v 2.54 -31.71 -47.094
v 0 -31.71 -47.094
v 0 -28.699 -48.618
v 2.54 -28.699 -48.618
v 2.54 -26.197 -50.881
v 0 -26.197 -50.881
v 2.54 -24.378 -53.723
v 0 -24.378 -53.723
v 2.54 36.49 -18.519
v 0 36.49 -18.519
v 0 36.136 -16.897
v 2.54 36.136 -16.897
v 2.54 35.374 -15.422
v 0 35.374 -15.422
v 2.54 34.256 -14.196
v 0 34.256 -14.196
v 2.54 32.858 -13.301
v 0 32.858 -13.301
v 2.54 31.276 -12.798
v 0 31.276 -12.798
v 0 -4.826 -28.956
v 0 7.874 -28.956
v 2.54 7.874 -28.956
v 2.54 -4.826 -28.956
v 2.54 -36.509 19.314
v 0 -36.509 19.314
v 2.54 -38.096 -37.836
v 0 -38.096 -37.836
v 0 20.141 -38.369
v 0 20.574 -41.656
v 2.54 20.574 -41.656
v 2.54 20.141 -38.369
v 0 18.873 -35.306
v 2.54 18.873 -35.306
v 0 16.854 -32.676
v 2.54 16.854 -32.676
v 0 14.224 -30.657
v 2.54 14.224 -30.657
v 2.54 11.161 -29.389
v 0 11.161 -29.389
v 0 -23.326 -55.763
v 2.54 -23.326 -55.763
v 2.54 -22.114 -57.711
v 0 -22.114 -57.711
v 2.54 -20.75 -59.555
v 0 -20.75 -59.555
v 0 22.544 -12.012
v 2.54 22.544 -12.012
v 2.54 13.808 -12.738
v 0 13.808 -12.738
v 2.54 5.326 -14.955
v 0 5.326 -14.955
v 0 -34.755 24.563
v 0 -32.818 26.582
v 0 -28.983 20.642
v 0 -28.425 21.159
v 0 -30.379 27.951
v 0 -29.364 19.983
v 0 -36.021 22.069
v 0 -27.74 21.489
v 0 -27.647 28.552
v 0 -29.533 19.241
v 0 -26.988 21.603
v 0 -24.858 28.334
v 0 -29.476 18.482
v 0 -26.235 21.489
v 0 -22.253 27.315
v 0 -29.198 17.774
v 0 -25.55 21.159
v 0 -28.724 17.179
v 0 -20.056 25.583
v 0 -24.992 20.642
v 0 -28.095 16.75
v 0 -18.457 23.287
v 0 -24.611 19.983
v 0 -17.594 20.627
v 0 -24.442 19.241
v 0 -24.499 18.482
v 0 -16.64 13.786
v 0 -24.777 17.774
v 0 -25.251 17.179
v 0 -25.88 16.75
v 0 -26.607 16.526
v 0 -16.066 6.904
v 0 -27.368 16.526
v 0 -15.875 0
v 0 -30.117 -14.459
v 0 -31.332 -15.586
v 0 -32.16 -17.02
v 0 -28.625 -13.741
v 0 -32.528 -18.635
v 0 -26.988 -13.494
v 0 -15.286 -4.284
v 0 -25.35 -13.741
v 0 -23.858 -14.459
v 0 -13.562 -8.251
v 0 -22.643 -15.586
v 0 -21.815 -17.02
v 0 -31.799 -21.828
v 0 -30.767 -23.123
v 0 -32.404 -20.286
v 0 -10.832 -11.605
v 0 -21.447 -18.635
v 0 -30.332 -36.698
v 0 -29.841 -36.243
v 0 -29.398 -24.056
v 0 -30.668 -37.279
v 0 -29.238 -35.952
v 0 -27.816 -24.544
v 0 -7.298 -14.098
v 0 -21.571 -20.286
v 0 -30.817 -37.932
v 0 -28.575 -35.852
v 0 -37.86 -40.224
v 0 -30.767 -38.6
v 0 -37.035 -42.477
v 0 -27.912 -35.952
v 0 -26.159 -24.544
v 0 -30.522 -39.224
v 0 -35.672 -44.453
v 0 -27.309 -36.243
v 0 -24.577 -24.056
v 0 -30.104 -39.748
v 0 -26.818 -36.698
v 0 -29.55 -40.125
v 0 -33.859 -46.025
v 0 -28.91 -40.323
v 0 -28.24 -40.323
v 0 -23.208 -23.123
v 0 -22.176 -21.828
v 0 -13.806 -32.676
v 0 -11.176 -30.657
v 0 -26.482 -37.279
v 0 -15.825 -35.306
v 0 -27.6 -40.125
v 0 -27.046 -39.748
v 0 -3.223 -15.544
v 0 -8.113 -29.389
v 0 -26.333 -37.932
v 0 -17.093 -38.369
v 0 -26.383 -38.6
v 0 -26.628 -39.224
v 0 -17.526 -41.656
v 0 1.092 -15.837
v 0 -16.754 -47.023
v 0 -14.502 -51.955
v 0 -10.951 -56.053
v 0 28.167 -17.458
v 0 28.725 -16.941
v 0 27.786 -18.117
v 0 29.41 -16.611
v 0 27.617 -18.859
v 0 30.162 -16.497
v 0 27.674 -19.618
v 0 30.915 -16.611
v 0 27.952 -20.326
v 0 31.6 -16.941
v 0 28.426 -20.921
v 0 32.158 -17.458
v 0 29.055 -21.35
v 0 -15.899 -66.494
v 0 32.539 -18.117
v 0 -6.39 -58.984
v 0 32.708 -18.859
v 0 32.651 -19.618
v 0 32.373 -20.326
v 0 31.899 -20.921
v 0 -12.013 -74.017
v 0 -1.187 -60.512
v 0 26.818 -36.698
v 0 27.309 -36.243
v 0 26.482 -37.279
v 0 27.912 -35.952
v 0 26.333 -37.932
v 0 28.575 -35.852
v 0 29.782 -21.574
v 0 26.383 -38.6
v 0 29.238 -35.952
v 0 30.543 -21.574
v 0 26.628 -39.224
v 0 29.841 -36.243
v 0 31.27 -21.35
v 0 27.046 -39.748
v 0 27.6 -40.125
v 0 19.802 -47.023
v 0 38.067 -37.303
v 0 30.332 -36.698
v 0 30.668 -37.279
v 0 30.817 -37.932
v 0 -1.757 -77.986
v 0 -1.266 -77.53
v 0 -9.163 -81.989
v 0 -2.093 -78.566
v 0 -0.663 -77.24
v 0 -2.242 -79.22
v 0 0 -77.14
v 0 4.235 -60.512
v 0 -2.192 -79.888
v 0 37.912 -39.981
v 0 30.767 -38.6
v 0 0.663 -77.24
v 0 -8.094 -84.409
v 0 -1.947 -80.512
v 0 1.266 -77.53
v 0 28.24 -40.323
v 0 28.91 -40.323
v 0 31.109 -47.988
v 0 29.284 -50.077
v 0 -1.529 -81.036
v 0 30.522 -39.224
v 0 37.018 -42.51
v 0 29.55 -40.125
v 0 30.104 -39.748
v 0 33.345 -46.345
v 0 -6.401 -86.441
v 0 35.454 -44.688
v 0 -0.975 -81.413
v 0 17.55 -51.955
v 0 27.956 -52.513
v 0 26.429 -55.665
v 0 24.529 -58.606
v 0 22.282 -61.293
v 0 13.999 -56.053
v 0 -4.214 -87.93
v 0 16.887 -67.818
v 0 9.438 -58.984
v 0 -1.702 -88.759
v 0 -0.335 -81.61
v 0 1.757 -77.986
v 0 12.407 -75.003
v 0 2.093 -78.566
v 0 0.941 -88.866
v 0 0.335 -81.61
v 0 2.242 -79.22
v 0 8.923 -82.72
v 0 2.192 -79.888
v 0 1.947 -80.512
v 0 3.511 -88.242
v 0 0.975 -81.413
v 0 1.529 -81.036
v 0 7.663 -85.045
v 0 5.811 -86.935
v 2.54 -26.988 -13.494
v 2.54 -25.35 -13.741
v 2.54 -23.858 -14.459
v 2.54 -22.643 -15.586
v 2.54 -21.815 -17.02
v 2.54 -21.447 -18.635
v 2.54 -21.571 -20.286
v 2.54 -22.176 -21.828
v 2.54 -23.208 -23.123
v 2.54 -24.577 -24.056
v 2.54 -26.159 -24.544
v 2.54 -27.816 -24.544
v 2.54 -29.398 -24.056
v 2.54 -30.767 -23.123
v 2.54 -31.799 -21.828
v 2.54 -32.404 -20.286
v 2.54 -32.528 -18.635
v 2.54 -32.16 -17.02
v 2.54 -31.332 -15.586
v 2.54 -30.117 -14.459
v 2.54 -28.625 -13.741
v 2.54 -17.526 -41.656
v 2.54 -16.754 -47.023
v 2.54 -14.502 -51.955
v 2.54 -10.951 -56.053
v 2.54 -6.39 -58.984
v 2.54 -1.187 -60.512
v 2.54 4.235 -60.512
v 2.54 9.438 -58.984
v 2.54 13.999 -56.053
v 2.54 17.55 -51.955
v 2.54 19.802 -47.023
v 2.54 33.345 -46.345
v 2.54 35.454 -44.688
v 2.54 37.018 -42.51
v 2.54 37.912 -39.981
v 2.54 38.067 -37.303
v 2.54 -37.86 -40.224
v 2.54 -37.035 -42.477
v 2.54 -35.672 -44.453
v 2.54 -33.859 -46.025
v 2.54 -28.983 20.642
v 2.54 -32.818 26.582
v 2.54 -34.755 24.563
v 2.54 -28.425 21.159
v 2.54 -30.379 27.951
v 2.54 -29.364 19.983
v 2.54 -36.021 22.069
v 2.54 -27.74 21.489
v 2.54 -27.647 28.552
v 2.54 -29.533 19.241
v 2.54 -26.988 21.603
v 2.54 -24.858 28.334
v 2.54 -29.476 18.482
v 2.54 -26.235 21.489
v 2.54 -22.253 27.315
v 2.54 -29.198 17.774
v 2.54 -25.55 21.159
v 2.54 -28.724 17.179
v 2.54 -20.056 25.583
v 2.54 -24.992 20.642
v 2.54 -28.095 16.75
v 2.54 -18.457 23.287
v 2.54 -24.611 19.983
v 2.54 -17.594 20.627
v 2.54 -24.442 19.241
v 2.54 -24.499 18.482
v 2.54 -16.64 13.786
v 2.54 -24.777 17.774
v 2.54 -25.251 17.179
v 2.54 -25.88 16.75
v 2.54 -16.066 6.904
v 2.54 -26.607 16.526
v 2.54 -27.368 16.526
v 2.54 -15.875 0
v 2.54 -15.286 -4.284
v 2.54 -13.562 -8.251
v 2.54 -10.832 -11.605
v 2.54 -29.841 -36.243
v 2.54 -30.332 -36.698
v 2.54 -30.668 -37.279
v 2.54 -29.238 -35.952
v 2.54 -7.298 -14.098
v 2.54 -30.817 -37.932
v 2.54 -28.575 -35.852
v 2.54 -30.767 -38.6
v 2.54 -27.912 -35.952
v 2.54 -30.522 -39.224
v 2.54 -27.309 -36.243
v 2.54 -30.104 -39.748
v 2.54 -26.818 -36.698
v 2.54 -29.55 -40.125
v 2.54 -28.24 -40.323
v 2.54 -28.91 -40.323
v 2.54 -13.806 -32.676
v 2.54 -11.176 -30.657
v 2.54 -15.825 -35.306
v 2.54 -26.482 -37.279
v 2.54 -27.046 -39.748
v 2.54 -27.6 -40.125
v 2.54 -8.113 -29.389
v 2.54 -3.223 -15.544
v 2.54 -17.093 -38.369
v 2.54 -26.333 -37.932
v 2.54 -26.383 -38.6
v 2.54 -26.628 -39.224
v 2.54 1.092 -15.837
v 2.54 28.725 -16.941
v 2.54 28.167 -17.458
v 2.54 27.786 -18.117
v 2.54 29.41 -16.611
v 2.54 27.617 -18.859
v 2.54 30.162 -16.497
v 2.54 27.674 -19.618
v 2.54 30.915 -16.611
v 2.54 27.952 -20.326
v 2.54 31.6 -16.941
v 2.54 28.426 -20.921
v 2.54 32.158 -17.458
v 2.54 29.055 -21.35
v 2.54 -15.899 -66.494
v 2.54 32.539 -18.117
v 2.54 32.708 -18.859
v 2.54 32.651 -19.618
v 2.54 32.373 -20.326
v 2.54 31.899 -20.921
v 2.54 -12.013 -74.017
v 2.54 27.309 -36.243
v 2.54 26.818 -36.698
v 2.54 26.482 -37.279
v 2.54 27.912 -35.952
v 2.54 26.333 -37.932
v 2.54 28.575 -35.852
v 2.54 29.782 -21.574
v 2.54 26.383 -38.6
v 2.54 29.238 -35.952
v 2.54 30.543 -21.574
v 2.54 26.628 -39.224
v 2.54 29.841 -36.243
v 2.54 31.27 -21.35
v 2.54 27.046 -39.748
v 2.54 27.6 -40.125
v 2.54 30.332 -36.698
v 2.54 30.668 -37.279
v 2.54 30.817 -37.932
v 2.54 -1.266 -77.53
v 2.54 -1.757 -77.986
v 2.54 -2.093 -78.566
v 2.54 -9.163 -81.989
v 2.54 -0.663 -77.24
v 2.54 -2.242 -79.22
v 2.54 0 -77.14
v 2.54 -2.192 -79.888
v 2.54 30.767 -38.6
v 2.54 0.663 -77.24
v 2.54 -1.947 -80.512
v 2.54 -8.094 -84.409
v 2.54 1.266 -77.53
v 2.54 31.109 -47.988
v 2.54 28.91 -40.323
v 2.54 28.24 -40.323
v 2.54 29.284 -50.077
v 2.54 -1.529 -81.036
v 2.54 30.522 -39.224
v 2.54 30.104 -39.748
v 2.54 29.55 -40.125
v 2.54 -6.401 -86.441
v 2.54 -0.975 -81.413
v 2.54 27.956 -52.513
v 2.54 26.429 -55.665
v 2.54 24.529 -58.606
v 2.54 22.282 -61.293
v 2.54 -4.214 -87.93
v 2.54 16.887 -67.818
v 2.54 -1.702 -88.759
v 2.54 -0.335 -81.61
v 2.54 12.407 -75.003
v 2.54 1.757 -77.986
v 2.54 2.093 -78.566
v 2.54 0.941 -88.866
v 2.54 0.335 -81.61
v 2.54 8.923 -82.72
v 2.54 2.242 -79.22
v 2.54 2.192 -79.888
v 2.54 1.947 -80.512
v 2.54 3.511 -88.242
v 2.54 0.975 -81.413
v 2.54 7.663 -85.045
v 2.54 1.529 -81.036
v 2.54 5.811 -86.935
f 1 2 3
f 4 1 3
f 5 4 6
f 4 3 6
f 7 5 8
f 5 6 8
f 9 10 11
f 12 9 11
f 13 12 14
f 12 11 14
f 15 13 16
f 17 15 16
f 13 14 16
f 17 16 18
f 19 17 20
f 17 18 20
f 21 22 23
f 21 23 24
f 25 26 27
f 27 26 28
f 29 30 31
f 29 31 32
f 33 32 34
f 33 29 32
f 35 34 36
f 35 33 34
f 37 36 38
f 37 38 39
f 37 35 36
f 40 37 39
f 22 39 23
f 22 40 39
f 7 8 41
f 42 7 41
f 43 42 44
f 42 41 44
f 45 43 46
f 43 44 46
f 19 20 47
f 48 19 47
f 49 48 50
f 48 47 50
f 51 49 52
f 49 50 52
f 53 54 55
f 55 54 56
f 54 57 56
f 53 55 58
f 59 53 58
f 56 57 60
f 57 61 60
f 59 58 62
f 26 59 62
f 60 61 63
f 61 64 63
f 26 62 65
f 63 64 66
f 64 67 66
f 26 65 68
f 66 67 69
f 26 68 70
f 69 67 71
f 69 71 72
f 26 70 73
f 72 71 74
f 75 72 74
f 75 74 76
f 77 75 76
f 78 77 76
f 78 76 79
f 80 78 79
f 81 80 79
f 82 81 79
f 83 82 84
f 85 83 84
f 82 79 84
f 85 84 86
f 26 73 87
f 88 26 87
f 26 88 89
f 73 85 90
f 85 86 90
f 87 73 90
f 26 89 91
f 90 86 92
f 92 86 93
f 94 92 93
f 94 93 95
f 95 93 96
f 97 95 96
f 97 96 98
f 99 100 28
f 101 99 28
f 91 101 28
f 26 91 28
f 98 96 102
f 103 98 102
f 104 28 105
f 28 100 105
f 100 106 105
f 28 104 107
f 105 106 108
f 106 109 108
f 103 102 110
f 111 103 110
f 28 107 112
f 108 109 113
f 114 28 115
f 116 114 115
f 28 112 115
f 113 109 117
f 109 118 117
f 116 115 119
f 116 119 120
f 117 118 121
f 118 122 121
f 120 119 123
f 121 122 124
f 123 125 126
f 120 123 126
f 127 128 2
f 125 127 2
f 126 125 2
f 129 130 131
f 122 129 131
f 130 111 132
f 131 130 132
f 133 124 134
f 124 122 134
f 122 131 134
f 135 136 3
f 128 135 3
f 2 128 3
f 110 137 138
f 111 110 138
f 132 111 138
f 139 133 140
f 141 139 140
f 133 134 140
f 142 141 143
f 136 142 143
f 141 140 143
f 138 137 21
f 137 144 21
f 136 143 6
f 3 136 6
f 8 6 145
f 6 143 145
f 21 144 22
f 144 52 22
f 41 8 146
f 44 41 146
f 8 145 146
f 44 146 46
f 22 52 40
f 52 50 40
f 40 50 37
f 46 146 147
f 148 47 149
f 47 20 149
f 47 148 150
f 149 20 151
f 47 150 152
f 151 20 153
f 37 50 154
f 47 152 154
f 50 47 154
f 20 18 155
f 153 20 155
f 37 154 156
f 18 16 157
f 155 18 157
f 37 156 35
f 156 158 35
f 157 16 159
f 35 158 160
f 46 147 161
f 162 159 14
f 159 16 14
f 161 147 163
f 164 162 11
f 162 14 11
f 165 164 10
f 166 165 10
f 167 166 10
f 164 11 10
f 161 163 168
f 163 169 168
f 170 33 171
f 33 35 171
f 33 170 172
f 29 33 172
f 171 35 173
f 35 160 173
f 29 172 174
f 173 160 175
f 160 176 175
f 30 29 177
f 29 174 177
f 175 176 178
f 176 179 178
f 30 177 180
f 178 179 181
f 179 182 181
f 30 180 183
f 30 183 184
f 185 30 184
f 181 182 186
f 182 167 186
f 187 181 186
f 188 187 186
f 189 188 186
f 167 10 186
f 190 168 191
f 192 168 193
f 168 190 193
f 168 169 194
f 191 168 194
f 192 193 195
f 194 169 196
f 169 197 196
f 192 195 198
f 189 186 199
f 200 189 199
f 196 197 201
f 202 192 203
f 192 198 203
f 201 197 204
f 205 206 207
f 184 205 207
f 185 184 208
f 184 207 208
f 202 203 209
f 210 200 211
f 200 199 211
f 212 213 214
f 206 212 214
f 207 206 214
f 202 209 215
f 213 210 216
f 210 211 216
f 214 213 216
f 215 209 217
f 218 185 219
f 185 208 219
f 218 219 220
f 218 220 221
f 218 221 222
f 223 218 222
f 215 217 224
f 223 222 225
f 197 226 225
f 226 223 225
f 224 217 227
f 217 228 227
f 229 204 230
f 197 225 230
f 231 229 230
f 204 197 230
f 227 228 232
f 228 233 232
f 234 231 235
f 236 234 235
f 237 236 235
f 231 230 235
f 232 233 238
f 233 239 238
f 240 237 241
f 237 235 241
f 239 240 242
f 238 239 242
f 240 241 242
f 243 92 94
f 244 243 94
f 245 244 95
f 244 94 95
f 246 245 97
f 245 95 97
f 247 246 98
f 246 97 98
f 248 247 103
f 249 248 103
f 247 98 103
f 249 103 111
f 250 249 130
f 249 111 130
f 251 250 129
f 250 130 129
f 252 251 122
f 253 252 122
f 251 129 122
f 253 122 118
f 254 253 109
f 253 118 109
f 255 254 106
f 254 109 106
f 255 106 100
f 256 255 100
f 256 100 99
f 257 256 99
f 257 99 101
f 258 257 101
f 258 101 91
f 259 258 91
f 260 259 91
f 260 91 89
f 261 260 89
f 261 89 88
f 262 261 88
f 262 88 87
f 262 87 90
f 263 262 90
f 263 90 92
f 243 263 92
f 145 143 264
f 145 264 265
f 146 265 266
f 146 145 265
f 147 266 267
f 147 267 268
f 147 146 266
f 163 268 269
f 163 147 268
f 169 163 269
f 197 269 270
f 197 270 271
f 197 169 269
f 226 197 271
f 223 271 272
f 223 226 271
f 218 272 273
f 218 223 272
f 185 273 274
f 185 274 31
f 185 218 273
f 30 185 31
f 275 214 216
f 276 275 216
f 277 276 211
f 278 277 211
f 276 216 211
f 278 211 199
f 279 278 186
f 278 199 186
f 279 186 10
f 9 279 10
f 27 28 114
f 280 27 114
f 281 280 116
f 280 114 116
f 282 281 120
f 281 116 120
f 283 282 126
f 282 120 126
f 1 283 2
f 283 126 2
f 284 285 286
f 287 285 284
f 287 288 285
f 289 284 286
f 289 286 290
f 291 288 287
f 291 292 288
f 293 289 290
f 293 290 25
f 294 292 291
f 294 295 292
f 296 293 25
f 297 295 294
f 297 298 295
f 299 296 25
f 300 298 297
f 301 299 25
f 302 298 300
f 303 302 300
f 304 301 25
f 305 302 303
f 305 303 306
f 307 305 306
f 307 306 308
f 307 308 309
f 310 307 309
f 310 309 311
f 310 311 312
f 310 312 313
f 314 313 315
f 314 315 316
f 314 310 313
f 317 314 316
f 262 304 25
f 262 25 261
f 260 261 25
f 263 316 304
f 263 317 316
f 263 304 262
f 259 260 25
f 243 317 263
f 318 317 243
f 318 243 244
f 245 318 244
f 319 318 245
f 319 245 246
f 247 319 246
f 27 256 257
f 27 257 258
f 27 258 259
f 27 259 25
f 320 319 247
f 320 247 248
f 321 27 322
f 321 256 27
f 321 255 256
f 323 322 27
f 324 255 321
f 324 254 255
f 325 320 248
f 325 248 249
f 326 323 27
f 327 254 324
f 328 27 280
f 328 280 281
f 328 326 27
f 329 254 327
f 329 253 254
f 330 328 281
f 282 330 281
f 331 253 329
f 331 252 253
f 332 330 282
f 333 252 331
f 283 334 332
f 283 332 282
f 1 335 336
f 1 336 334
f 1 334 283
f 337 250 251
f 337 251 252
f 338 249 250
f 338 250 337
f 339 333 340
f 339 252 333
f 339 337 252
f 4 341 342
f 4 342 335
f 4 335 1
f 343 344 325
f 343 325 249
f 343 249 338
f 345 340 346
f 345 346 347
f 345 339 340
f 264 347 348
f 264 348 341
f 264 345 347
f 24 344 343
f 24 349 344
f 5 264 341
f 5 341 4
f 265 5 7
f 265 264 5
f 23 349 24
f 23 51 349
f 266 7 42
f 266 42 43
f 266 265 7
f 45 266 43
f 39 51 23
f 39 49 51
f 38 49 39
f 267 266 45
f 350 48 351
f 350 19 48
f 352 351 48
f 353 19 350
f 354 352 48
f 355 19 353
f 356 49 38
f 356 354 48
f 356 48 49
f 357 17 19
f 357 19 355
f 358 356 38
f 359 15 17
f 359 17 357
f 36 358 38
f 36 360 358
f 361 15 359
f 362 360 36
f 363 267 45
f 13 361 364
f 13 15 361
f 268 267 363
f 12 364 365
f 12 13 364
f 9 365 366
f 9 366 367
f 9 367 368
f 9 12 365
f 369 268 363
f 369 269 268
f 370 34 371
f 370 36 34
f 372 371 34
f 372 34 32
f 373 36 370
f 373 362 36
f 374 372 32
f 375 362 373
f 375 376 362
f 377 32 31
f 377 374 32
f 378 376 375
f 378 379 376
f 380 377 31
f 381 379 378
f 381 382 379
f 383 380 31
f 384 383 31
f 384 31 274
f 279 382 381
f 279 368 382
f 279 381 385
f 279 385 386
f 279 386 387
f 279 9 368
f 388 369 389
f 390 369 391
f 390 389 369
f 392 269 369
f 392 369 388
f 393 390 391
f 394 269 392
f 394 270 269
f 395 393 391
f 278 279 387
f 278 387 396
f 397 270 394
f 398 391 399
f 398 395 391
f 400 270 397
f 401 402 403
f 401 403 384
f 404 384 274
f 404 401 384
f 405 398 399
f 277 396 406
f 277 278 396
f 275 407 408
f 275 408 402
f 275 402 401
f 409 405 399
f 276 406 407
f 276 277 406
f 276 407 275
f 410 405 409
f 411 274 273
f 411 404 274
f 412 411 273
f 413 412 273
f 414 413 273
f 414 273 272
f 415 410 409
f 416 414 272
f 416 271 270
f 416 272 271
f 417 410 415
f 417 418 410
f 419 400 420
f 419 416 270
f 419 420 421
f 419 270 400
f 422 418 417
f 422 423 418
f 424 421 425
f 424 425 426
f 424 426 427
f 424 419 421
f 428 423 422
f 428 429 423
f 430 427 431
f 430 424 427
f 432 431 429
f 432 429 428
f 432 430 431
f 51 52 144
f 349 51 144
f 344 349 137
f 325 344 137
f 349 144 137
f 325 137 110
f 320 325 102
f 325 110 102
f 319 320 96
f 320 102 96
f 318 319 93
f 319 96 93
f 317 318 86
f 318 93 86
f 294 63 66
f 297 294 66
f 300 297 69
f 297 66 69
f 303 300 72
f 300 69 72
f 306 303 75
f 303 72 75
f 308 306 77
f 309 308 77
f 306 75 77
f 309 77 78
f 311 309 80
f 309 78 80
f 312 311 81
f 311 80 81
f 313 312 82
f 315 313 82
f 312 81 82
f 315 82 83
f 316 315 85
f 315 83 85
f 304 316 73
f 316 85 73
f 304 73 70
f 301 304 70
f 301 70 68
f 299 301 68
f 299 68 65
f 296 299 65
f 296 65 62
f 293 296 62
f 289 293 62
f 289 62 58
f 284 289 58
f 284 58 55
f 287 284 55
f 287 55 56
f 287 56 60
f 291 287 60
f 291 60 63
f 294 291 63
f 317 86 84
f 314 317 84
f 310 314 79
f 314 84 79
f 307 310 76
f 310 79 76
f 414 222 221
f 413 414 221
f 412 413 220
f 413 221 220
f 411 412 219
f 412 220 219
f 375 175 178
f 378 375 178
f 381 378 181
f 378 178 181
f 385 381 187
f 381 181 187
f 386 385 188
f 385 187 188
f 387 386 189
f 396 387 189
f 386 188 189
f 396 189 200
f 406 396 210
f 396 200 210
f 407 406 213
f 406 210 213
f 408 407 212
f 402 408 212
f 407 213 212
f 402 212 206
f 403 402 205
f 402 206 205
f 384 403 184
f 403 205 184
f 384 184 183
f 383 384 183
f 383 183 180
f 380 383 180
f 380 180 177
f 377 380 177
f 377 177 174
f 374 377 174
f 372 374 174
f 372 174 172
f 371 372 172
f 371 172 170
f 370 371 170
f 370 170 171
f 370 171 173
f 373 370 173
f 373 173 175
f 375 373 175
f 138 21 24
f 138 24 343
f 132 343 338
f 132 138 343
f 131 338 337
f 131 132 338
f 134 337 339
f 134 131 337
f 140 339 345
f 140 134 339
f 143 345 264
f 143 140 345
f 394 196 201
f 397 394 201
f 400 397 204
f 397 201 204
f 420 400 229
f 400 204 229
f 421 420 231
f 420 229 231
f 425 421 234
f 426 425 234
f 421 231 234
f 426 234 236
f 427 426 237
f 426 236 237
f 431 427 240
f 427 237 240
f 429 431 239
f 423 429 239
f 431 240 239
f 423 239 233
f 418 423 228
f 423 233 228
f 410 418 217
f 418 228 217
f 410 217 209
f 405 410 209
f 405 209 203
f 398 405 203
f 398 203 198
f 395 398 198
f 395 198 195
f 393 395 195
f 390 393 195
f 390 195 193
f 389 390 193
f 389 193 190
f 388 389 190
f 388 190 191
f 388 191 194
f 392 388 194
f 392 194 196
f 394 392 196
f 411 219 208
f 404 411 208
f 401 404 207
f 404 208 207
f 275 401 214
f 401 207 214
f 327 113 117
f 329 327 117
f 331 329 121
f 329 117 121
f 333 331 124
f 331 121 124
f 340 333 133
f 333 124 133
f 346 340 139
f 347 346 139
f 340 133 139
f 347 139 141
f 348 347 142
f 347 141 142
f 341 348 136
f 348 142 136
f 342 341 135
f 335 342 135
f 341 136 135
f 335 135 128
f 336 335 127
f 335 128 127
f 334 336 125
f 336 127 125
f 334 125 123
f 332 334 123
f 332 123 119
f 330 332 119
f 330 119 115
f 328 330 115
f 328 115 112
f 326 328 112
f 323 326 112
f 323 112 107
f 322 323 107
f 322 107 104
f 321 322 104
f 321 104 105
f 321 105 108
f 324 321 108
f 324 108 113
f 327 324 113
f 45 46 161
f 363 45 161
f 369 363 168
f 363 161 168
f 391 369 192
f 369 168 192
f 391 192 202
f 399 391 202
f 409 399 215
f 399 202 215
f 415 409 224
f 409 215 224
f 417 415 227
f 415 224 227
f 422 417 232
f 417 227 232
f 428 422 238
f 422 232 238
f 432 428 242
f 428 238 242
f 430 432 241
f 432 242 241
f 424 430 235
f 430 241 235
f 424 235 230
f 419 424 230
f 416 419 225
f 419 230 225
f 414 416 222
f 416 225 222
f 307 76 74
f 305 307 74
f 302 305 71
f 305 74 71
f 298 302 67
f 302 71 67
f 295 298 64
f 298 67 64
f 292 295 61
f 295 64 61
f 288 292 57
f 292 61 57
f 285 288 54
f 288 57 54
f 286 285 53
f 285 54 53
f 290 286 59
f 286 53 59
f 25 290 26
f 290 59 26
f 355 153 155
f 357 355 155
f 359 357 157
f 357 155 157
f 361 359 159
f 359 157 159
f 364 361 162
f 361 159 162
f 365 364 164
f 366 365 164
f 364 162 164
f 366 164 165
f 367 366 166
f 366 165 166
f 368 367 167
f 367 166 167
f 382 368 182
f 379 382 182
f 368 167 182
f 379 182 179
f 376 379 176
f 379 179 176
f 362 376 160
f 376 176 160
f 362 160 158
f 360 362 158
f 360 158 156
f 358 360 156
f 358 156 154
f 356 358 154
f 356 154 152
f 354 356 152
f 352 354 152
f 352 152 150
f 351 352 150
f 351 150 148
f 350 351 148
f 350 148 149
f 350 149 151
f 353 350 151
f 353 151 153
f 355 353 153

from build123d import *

# Parameters (mm, degrees)
BOSS_EXTRUDE1_DEPTH            = 2.54
F_7_16_0_4375_DIAMETER_HOLE1_D = 11.1125
F_8_CLEARANCE_HOLE2_D          = 4.4958
F_10_CLEARANCE_HOLE2_D         = 5.1054


with BuildPart() as part:
    # Sketch1 → Boss-Extrude1 (new body)
    with BuildSketch(Plane(origin=(0, 0, 0), x_dir=(0, 0, -1), z_dir=(1, 0, 0))):
        with BuildLine():
            Line((-19.314481315, -36.508827357), (37.835518685, -38.096327357))
            ThreePointArc((37.835518685, -38.096327357), (43.508241138, -36.415698489), (47.094324235, -31.709925286))
            ThreePointArc((47.094324235, -31.709925286), (49.666291071, -27.372500374), (53.723446842, -24.377879309))
            ThreePointArc((53.723446842, -24.377879309), (56.748764885, -22.739945951), (59.555317673, -20.750313723))
            ThreePointArc((59.555317673, -20.750313723), (70.190449205, -13.830311686), (81.989075544, -9.162885478))
            ThreePointArc((81.989075544, -9.162885478), (88.904940009, -0.38440552), (82.719582069, 8.923238587))
            ThreePointArc((82.719582069, 8.923238587), (71.335814009, 14.527011927), (61.293419407, 22.282188362))
            ThreePointArc((61.293419407, 22.282188362), (57.164774633, 25.524177799), (52.512741108, 27.956211363))
            ThreePointArc((52.512741108, 27.956211363), (48.982518098, 30.139520785), (46.344839733, 33.344511796))
            ThreePointArc((46.344839733, 33.344511796), (42.509528769, 37.017847922), (37.303469713, 38.066636556))
            Line((37.303469713, 38.066636556), (18.518979809, 36.490257704))
            ThreePointArc((18.518979809, 36.490257704), (14.772389284, 34.855531703), (12.798400928, 31.276056933))
            ThreePointArc((12.798400928, 31.276056933), (12.18571912, 18.160305029), (14.955046072, 5.325619398))
            ThreePointArc((14.955046072, 5.325619398), (12.972274915, -9.150721749), (0, -15.875))
            ThreePointArc((0, -15.875), (-10.349023893, -16.30546329), (-20.626551724, -17.59387931))
            ThreePointArc((-20.626551724, -17.59387931), (-28.552166362, -27.646635371), (-19.314481315, -36.508827357))
        make_face()
        with BuildLine():
            Line((28.956, 7.874), (28.956, -4.826))
            ThreePointArc((28.956, -4.826), (32.675743879, -13.806256121), (41.656, -17.526))
            ThreePointArc((41.656, -17.526), (60.706, 1.524), (41.656, 20.574))
            ThreePointArc((41.656, 20.574), (32.675743879, 16.854256121), (28.956, 7.874))
        make_face(mode=Mode.SUBTRACT)
    extrude(amount=BOSS_EXTRUDE1_DEPTH)

    # 7/16 (0.4375) Diameter Hole1 (through all)
    with Locations(Plane(origin=(2.54, 0, 0), x_dir=(0, 0, -1), z_dir=(1, 0, 0))):
        with Locations((19.05, -26.9875)):
            Hole(F_7_16_0_4375_DIAMETER_HOLE1_D / 2)

    # #8 Clearance Hole2 (through all)
    with Locations(Plane(origin=(2.54, 0, 0), x_dir=(0, 0, -1), z_dir=(1, 0, 0))):
        with Locations((38.1, -28.575), (79.3877, 0), (38.1, 28.575)):
            Hole(F_8_CLEARANCE_HOLE2_D / 2)

    # #10 Clearance Hole2 (through all)
    with Locations(Plane(origin=(2.54, 0, 0), x_dir=(0, 0, -1), z_dir=(1, 0, 0))):
        with Locations((-19.05, -26.9875), (19.05, 30.1625)):
            Hole(F_10_CLEARANCE_HOLE2_D / 2)


solid = part.part
